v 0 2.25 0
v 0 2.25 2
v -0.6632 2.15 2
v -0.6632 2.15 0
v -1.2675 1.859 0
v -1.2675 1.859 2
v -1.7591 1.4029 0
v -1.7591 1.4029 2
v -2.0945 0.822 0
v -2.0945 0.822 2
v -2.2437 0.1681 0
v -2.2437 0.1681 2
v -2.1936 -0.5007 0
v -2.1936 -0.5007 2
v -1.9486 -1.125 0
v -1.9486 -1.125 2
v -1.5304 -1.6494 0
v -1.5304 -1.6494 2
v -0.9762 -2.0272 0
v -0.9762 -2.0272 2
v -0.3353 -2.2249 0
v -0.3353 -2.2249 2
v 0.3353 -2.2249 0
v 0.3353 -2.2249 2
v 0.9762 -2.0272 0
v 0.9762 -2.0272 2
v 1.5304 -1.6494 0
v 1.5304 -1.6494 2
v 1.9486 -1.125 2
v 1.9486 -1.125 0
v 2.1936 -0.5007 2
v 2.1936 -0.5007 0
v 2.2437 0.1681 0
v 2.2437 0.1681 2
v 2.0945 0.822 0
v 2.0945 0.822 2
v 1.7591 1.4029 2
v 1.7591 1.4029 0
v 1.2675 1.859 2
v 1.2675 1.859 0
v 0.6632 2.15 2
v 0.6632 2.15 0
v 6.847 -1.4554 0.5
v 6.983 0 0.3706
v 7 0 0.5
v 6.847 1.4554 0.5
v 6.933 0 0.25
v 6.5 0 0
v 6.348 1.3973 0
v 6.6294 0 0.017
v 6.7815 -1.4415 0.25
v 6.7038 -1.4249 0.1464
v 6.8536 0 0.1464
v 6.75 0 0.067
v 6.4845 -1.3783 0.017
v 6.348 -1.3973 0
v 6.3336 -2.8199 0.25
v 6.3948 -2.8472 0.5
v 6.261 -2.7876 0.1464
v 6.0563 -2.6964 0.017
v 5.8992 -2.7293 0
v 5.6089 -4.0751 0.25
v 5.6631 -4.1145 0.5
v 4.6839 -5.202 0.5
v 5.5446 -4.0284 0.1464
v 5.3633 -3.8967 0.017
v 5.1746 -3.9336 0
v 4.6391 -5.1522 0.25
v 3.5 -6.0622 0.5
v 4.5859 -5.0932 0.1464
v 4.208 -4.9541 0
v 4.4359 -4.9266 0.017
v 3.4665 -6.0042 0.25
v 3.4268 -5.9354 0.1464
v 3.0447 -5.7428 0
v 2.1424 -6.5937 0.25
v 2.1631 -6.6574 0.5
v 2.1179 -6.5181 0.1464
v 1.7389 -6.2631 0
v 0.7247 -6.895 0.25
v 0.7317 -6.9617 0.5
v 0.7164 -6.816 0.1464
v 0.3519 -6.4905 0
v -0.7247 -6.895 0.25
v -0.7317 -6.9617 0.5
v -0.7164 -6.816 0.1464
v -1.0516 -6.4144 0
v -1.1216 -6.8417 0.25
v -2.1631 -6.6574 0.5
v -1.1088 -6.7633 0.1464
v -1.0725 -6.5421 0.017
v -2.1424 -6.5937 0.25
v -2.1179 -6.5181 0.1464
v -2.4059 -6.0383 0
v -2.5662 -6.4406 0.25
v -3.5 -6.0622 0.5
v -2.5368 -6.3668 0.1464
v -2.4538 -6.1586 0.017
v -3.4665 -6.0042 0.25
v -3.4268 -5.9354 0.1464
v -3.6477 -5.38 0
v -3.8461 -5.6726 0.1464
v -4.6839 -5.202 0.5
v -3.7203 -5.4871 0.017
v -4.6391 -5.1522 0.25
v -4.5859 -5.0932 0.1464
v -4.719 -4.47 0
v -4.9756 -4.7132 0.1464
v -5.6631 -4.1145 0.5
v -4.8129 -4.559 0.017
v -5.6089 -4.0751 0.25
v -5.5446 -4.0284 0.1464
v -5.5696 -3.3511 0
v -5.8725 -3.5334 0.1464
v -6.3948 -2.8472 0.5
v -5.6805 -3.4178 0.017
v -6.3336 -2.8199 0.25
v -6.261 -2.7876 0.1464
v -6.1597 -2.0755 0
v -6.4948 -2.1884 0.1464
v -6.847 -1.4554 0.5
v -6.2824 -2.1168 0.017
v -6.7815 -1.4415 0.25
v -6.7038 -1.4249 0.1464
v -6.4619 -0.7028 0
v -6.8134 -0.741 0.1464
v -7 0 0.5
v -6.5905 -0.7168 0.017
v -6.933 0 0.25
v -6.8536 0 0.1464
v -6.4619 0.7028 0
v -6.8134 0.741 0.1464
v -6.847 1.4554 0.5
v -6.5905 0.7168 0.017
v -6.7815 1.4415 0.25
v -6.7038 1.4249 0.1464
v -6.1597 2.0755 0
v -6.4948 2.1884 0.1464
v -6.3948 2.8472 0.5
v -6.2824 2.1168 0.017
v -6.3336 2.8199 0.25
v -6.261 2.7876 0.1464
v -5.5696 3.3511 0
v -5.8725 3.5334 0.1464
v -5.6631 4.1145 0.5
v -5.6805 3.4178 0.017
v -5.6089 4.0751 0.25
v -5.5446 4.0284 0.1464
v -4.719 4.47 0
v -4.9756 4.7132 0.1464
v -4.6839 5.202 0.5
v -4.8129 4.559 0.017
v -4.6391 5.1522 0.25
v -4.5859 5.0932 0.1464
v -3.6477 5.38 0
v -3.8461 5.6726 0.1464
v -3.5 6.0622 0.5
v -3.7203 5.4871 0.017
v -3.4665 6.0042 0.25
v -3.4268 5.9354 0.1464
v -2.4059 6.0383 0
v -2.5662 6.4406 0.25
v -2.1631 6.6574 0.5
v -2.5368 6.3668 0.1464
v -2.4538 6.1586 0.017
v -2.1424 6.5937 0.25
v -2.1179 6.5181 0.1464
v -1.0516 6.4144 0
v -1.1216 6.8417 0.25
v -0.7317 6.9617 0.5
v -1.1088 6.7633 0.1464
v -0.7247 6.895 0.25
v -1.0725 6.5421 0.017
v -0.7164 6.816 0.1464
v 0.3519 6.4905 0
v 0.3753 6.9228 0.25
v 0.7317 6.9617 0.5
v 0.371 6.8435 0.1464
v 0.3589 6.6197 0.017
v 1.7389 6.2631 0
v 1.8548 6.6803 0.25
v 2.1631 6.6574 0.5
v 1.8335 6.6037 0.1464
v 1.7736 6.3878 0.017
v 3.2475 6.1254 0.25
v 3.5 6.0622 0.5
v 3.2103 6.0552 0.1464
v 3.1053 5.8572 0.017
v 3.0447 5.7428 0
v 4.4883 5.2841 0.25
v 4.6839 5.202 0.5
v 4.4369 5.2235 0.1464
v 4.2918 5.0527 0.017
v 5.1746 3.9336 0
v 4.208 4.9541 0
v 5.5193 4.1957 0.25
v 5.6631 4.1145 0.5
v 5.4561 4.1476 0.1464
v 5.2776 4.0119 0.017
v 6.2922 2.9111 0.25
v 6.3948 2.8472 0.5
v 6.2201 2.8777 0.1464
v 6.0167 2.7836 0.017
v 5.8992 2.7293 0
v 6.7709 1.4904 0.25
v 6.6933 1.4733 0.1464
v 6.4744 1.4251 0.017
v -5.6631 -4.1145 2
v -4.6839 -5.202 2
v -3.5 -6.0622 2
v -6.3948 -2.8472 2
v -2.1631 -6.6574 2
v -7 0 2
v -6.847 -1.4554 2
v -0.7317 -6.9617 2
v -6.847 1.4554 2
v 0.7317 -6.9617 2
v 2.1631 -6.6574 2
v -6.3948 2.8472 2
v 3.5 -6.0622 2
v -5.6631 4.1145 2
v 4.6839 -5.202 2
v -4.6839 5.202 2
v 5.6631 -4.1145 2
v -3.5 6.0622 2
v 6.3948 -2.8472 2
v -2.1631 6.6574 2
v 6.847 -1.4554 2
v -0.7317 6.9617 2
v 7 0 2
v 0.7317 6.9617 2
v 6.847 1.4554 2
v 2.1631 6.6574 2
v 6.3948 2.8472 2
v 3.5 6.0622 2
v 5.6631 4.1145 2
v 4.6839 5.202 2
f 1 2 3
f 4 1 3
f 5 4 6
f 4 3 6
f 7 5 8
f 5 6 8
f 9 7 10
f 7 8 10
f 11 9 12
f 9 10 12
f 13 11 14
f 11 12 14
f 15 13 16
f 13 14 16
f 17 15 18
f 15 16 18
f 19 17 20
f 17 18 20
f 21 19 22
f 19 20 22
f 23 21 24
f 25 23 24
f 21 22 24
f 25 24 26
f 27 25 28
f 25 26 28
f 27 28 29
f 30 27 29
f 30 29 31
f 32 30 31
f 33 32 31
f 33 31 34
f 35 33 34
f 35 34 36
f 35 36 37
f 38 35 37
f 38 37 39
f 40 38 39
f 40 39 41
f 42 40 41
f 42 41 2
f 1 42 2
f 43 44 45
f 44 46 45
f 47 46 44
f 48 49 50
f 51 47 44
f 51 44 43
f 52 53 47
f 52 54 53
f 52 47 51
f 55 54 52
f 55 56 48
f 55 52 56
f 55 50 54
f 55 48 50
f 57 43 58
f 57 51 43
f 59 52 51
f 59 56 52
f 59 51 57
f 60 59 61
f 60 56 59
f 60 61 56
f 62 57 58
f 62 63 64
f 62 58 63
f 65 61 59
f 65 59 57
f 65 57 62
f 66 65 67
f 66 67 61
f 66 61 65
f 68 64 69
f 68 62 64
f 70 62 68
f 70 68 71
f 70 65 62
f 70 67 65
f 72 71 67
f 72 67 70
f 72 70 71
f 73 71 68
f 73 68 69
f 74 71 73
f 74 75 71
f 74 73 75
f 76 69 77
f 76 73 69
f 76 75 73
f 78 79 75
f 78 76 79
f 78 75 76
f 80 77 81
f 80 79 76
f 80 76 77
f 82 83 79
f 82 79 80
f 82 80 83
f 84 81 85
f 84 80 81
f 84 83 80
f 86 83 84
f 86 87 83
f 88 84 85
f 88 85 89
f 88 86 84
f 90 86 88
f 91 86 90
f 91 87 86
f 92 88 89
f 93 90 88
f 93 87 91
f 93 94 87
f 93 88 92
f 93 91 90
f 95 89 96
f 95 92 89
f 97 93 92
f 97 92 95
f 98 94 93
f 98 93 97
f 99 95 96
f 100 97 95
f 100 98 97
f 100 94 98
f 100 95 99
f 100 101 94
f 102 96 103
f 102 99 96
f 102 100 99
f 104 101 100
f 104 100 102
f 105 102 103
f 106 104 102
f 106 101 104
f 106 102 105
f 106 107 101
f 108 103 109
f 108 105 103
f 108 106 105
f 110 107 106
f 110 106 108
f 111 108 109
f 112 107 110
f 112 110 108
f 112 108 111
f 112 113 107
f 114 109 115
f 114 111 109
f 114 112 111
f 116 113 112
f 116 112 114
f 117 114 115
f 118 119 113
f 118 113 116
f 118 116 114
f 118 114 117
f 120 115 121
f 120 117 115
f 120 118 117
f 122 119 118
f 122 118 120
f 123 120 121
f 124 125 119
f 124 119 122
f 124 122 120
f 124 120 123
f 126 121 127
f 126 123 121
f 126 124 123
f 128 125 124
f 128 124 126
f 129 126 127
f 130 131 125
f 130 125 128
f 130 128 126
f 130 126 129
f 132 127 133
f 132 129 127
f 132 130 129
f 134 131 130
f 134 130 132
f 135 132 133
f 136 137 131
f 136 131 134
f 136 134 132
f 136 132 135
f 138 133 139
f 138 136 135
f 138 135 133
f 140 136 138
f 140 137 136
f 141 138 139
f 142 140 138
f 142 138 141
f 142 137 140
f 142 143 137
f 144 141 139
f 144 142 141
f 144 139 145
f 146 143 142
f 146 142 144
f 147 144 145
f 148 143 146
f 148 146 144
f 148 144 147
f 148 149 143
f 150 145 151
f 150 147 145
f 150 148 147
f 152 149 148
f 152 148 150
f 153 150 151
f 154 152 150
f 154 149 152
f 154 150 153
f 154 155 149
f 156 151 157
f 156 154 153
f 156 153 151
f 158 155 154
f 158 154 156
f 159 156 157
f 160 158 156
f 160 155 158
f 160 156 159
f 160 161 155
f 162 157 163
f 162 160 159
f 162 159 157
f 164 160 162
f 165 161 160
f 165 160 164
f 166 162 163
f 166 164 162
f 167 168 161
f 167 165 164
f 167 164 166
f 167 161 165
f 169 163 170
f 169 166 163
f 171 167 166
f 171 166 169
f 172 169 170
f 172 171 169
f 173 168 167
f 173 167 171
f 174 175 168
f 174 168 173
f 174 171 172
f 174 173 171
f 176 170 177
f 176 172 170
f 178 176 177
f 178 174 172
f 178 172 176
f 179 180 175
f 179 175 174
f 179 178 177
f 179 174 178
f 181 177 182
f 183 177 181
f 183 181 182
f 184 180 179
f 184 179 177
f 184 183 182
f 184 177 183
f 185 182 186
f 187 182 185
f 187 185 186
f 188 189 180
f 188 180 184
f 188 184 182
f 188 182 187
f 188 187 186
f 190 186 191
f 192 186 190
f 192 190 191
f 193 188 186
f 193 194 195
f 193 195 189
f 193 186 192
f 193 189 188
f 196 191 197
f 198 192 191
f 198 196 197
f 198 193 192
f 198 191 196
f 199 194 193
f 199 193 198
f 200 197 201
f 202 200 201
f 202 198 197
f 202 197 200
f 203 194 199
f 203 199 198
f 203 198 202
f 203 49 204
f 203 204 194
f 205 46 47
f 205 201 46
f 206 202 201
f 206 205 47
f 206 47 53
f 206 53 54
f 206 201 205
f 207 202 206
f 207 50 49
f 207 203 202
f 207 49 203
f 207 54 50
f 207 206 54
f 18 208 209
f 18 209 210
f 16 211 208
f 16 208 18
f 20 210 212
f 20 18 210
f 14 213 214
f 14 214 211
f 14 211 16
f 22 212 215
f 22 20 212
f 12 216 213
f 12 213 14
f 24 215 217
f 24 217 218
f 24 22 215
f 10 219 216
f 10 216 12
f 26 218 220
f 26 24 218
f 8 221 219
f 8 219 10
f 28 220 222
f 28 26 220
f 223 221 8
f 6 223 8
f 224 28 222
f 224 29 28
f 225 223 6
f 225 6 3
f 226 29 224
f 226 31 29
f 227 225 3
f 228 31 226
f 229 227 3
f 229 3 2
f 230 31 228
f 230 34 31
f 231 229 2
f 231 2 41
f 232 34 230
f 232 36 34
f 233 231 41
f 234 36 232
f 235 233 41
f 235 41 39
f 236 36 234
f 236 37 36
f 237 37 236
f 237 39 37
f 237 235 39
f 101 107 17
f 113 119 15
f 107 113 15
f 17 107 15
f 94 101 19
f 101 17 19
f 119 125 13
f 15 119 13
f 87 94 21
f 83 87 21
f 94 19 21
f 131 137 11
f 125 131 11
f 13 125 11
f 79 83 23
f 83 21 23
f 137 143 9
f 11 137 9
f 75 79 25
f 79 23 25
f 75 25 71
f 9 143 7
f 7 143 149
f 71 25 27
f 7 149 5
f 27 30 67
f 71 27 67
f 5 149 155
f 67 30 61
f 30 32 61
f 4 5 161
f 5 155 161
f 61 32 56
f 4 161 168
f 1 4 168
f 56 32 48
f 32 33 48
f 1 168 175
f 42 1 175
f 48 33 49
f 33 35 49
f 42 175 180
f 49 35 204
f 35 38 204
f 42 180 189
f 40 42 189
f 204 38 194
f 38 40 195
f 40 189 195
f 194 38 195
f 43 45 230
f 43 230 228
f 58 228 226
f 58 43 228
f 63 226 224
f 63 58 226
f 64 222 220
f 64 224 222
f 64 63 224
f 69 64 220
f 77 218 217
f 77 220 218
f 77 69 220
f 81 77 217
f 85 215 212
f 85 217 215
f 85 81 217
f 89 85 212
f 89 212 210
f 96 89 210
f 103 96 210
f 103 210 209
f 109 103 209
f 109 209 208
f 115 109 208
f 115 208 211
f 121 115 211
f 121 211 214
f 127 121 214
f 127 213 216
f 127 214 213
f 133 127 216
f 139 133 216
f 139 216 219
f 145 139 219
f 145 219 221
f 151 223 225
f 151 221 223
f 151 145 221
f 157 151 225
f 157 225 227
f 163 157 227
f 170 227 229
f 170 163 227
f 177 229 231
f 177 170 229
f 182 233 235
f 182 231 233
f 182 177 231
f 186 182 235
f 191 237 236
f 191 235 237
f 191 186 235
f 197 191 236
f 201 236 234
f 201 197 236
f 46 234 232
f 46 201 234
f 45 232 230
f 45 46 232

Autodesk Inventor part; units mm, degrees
ref_plane "YZ Plane" through (0, 0, 0) normal (1, 0, 0) x (0, 1, 0)
ref_plane "XZ Plane" through (0, 0, 0) normal (0, 1, 0) x (-1, 0, 0)
ref_plane "XY Plane" through (0, 0, 0) normal (0, 0, 1) x (1, 0, 0)
sketch "Sketch2" plane through (0, 0, 0) normal (0, 0, 1) x (1, 0, 0)
  circle A0 centre (0, 0) radius 7
  dimension "d0" = 14
extrude "Extrusion1" add sketch "Sketch2" along normal blind 2
fillet "Fillet2" radius 0.5 1 edges at (-7, 0, 0)
hole "Hole1" at (0, 0, 0) direction (0, 0, 1) diameter 4.5 end through all clearance for "Countersunk Flat Head Screw ISO 2009/7046" size "M4" standard "ISO"
properties part number "P020" material "Aluminium"
